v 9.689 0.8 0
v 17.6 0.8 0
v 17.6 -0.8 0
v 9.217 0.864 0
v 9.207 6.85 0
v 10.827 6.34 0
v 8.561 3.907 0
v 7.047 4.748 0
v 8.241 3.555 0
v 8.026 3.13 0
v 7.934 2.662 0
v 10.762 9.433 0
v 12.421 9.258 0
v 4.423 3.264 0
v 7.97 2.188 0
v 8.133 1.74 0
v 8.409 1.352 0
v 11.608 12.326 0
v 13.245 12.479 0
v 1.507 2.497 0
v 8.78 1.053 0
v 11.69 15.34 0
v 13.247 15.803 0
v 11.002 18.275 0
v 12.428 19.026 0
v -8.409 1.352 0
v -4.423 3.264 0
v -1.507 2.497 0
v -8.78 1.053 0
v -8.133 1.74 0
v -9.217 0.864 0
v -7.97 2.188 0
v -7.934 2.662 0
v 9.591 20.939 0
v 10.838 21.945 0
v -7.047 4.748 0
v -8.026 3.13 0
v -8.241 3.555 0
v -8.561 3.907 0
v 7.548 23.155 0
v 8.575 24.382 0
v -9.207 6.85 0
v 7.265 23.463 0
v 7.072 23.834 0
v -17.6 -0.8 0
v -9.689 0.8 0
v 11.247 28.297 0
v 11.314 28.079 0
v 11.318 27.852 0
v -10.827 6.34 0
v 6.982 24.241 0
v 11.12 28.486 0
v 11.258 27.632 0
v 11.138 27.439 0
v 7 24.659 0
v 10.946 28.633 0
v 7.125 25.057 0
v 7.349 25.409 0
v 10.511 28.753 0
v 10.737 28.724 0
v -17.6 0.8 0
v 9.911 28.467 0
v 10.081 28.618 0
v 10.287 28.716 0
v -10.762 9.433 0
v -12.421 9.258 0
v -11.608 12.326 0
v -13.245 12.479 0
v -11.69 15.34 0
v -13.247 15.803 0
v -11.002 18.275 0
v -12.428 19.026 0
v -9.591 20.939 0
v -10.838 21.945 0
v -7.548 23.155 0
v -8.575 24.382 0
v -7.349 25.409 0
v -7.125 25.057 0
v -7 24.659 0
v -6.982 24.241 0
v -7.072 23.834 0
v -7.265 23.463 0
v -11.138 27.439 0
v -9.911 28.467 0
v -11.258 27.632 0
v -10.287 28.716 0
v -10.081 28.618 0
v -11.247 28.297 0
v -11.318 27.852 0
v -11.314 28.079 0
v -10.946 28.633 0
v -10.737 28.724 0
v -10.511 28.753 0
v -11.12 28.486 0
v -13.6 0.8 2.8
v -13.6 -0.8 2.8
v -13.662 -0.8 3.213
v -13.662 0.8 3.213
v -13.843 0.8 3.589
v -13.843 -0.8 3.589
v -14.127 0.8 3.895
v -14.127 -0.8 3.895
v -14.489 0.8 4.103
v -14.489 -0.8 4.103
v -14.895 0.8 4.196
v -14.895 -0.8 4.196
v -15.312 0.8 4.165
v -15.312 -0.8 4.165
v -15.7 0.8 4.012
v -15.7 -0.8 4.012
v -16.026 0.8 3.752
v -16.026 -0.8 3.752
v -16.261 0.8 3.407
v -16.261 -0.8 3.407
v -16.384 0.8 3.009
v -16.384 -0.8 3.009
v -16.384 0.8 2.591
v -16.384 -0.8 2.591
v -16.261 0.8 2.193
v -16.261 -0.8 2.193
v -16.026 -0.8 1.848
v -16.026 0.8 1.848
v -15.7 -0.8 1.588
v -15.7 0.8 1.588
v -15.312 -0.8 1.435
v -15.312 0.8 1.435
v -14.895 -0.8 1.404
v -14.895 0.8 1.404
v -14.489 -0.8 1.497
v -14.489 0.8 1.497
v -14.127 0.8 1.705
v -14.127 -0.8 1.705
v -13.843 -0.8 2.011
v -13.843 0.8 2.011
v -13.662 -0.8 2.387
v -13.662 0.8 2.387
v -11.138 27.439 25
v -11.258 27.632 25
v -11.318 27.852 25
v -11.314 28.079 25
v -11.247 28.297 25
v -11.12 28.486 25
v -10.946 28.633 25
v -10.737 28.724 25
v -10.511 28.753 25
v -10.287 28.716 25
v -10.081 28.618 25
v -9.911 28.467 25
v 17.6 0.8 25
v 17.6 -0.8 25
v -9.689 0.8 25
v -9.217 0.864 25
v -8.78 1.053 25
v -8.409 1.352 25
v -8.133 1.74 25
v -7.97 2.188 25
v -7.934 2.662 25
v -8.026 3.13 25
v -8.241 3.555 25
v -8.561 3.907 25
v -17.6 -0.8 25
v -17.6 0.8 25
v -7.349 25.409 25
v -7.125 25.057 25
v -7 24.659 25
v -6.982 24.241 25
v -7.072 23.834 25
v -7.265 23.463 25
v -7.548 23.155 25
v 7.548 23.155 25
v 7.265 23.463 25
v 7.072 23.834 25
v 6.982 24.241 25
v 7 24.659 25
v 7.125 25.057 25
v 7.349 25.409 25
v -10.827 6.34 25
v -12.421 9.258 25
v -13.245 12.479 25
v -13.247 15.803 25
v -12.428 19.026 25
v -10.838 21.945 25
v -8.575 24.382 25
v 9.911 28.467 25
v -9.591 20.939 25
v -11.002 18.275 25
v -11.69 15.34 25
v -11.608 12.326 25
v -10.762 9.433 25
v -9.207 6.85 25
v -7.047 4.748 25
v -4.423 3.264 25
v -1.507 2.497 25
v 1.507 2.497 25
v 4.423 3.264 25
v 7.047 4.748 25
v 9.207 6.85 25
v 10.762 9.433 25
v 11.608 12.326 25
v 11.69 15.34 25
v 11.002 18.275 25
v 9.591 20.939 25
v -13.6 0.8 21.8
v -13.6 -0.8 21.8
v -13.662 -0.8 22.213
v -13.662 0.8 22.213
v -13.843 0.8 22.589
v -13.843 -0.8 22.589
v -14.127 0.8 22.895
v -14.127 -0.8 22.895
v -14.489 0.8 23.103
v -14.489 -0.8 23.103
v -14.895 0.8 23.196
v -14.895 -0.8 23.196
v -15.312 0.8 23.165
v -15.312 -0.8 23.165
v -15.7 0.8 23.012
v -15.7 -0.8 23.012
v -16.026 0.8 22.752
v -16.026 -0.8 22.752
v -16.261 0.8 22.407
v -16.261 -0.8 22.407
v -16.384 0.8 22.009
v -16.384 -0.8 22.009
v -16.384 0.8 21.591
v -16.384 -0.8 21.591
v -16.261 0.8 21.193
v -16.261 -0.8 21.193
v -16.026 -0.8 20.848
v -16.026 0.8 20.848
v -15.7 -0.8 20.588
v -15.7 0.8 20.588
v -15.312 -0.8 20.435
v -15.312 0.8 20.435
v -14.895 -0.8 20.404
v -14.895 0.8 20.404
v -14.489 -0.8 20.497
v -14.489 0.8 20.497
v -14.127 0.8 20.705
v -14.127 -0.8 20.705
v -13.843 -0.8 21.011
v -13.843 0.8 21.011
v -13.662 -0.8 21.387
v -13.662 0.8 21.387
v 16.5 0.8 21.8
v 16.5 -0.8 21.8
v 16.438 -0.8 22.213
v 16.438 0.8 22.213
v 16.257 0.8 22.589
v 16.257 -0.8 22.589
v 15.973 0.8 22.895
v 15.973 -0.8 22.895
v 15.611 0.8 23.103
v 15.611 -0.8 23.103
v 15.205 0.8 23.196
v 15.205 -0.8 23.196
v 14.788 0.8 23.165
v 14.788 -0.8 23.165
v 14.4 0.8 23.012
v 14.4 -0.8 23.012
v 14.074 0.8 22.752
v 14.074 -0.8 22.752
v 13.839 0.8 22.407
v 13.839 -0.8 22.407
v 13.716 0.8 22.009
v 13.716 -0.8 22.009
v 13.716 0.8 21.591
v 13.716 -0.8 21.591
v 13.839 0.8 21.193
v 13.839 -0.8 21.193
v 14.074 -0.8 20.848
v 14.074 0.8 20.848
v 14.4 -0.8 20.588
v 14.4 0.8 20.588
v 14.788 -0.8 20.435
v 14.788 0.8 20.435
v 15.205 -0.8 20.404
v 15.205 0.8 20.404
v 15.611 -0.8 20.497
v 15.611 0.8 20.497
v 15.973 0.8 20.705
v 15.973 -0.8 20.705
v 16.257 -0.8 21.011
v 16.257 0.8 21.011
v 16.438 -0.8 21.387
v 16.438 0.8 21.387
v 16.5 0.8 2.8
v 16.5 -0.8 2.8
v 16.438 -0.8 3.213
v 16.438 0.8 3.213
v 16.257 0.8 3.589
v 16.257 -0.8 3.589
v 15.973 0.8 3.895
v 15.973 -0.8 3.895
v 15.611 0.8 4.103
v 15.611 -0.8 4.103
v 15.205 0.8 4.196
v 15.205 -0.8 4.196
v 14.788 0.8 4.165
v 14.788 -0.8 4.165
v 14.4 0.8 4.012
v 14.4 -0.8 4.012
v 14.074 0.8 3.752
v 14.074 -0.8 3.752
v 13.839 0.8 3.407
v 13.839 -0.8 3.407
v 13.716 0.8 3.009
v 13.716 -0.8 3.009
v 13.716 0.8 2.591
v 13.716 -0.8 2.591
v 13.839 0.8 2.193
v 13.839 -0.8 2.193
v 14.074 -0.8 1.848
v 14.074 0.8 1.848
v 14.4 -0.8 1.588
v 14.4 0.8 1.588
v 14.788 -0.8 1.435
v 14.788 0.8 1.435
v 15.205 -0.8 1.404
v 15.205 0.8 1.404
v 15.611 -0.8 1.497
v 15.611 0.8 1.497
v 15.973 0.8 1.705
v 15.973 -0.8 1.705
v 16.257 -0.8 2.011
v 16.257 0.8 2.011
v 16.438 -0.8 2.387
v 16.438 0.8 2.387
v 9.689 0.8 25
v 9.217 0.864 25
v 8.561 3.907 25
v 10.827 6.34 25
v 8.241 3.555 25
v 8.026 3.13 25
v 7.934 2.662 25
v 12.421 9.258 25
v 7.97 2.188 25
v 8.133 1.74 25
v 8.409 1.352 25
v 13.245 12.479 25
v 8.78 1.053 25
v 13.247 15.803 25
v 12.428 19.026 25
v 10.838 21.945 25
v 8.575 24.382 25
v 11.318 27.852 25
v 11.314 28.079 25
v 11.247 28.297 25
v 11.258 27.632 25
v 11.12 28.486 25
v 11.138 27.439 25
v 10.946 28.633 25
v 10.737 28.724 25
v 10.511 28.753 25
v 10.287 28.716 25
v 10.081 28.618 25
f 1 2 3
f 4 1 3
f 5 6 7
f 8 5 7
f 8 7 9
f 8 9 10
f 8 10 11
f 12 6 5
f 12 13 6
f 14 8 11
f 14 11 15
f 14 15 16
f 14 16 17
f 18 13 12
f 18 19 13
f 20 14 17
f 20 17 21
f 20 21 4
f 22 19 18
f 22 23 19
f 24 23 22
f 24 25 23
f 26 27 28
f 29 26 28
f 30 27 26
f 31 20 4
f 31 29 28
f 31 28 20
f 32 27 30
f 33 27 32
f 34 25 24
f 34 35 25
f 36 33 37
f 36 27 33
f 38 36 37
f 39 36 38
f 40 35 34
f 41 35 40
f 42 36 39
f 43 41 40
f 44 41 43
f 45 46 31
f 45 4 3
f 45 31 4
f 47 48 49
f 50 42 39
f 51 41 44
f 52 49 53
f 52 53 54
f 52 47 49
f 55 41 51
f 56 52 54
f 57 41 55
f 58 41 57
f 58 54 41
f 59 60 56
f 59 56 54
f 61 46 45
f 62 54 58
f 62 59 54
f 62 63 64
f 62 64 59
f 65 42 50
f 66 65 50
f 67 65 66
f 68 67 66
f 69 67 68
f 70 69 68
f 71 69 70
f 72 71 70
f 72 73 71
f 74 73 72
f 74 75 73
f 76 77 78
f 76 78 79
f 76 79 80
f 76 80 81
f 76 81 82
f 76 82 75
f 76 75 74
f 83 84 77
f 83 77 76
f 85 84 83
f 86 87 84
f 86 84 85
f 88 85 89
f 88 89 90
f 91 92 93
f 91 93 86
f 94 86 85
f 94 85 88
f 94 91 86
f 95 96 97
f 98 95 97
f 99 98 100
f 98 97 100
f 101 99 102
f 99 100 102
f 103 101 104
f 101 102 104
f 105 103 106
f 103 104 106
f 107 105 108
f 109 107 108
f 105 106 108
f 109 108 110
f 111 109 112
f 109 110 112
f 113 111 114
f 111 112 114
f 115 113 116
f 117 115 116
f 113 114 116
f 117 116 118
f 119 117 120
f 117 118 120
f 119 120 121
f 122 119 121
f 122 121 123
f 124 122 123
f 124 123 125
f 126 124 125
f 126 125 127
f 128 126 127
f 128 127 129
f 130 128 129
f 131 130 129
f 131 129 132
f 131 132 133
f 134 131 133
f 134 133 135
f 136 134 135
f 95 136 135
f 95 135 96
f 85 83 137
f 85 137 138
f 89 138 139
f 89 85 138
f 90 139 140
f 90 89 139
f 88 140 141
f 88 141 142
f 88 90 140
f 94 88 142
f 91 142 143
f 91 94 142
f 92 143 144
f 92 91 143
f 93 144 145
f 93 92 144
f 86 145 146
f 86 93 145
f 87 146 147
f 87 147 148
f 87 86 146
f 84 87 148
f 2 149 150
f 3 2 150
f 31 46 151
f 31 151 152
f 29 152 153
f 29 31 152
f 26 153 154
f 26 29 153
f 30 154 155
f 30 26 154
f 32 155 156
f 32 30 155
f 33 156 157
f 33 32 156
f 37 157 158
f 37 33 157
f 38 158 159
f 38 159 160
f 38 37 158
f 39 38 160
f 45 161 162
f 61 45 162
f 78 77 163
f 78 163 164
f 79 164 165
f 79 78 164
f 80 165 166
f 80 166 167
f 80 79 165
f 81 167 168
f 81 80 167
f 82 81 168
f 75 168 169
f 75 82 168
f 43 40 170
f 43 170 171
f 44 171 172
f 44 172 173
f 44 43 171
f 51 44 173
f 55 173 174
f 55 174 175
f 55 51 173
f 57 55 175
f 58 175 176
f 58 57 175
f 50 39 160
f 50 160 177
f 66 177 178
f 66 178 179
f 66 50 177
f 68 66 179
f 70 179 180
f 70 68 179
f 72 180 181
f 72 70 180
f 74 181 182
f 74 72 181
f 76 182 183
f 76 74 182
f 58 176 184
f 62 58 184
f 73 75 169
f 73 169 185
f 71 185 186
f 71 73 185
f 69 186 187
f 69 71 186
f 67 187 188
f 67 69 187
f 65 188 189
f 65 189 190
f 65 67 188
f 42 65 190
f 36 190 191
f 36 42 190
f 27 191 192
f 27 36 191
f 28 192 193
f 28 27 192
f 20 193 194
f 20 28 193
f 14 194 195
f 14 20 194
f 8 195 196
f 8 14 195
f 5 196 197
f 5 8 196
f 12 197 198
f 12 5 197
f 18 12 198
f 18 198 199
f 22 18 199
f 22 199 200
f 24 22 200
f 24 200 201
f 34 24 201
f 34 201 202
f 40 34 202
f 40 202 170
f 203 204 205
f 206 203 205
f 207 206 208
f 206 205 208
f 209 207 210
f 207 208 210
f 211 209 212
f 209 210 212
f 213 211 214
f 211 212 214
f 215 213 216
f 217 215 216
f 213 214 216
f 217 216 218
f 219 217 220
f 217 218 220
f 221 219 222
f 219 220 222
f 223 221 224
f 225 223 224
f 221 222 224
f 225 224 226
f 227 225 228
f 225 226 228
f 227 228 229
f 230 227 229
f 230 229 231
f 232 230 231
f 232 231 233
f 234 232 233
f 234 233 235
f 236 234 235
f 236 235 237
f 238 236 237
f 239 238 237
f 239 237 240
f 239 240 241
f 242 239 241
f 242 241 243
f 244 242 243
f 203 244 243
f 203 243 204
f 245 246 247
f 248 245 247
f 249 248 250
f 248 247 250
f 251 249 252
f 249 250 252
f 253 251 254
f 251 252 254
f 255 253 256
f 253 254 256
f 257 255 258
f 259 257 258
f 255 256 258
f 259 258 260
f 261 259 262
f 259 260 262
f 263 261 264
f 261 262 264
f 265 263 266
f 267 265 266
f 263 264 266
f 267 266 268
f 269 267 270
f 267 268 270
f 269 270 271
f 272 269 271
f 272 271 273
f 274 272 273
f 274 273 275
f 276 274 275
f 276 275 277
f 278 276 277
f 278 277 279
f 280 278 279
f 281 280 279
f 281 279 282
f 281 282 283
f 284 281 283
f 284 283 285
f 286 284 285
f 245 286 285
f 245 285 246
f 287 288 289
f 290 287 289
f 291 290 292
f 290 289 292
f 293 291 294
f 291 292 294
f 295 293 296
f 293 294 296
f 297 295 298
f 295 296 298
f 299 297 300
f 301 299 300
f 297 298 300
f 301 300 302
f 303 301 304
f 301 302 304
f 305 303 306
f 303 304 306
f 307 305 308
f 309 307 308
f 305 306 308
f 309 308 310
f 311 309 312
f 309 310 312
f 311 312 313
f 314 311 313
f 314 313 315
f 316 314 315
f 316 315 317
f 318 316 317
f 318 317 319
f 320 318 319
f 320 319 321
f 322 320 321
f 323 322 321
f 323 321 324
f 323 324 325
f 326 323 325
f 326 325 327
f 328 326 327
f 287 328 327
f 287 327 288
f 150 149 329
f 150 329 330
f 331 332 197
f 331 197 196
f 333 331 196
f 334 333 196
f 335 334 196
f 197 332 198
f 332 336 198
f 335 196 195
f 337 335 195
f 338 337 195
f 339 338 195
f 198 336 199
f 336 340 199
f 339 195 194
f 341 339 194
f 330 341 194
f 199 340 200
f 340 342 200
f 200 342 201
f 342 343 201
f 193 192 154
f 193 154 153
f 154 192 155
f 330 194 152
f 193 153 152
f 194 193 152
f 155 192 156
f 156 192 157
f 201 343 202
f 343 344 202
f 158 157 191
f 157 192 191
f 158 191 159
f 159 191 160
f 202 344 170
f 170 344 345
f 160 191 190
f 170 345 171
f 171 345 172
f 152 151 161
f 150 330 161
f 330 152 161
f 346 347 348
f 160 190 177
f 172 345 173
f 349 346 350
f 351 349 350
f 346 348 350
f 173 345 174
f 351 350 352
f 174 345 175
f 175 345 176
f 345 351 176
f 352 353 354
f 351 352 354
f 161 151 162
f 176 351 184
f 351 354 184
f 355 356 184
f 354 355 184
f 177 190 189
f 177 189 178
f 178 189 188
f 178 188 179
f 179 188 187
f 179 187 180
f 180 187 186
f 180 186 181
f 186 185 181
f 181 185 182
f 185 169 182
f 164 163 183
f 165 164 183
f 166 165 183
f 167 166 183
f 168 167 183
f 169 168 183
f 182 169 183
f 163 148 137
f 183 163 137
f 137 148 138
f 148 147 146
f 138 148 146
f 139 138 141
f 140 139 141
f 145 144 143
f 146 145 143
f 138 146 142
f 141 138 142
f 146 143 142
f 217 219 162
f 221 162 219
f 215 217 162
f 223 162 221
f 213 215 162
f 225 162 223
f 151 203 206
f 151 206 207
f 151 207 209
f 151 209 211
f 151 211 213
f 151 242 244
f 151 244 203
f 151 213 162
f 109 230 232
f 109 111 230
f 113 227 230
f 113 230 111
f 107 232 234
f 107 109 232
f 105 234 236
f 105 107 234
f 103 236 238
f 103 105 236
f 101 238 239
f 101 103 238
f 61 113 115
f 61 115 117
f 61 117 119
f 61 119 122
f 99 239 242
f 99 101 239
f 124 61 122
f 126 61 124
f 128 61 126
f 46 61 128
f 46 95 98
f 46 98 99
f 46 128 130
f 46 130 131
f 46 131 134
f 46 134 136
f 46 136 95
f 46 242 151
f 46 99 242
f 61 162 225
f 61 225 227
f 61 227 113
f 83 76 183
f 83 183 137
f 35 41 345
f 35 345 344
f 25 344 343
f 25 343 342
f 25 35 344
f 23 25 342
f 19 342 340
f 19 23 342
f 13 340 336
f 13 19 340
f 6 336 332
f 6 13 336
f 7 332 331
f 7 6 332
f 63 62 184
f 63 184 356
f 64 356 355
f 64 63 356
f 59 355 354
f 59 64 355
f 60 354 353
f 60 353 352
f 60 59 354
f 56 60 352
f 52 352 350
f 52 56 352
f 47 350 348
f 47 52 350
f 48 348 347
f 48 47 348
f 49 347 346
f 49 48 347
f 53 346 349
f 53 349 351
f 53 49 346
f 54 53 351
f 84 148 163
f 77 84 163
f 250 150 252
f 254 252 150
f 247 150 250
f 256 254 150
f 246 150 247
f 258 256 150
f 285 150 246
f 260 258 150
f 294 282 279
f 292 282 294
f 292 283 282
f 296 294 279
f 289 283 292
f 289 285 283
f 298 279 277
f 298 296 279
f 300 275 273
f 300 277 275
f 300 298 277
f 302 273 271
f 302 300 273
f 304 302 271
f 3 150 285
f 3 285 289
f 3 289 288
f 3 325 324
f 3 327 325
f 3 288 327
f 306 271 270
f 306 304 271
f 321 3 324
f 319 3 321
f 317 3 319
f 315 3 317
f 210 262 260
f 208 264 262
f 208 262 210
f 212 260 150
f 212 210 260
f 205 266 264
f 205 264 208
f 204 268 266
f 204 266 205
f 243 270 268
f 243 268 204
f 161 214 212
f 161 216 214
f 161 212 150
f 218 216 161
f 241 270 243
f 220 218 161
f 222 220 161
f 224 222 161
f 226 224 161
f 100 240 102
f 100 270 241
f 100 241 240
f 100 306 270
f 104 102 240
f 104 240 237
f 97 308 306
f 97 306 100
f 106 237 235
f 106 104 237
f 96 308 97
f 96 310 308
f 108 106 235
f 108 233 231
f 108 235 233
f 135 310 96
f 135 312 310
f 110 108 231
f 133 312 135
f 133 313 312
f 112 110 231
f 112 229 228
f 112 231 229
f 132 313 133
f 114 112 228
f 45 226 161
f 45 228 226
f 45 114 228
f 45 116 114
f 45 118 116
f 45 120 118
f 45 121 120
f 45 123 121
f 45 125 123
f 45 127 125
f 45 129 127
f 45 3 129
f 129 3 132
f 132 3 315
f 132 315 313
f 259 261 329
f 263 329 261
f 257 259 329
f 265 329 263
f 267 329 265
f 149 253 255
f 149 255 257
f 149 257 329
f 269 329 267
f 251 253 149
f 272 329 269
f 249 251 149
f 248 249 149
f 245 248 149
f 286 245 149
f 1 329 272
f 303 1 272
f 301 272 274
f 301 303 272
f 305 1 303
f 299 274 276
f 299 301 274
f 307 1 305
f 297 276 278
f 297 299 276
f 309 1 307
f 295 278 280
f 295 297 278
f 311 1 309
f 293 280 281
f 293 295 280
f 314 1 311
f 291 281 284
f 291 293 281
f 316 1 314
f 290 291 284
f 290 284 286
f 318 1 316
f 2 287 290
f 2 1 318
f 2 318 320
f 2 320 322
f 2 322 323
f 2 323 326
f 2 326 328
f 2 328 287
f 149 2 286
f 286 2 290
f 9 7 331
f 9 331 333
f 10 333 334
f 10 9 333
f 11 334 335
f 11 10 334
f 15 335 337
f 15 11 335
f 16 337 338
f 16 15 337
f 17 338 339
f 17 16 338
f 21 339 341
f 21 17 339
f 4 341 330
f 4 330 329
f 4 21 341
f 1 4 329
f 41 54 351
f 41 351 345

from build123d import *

# Parameters (mm, degrees)
BOSS_EXTRUDE1_DEPTH = 25
CUT_EXTRUDE1_REACH  = 31.553
SKETCH3_R           = 1.4


with BuildPart() as part:
    # Sketch1 → Boss-Extrude1 (new body)
    with BuildSketch(Plane.XY):
        with BuildLine():
            Line((-17.6, 0.8), (-9.688838924, 0.8))
            ThreePointArc((-9.688838924, 0.8), (-8.036343261, 1.958278485), (-8.561462594, 3.906765244))
            ThreePointArc((-8.561462594, 3.906765244), (-13.349996928, 14.140943968), (-8.575351799, 24.381609919))
            Line((-8.575351799, 24.381609919), (-11.137608501, 27.438745265))
            ThreePointArc((-11.137608501, 27.438745265), (-11.038357078, 28.565754207), (-9.911348137, 28.466502784))
            Line((-9.911348137, 28.466502784), (-7.349091434, 25.409367438))
            ThreePointArc((-7.349091434, 25.409367438), (-6.981520468, 24.24124721), (-7.54759428, 23.155349554))
            ThreePointArc((-7.54759428, 23.155349554), (0, 2.4), (7.54759428, 23.155349554))
            ThreePointArc((7.54759428, 23.155349554), (6.981520468, 24.24124721), (7.349091434, 25.409367438))
            Line((7.349091434, 25.409367438), (9.911348137, 28.466502784))
            ThreePointArc((9.911348137, 28.466502784), (11.038357078, 28.565754207), (11.137608501, 27.438745265))
            Line((11.137608501, 27.438745265), (8.575351799, 24.381609919))
            ThreePointArc((8.575351799, 24.381609919), (13.349996928, 14.140943968), (8.561462594, 3.906765244))
            ThreePointArc((8.561462594, 3.906765244), (8.036343261, 1.958278485), (9.688838924, 0.8))
            Line((9.688838924, 0.8), (17.6, 0.8))
            Line((17.6, 0.8), (17.6, -0.8))
            Line((17.6, -0.8), (-17.6, -0.8))
            Line((-17.6, -0.8), (-17.6, 0.8))
        make_face()
    extrude(amount=BOSS_EXTRUDE1_DEPTH)

    # Sketch3 → Cut-Extrude1 (cut, up to next)
    with BuildSketch(Plane.XZ.offset(0.8), mode=Mode.PRIVATE) as cut_extrude1_sk1:
        with Locations((-15, 21.8)):
            Circle(SKETCH3_R)
    cut_extrude1_tool1 = extrude(cut_extrude1_sk1.sketch, amount=-CUT_EXTRUDE1_REACH, mode=Mode.PRIVATE) & part.part
    add(cut_extrude1_tool1.solids().sort_by_distance((-15, -0.8, 21.8))[0], mode=Mode.SUBTRACT)
    # Sketch3 → Cut-Extrude1 (cut, up to next)
    with BuildSketch(Plane.XZ.offset(0.8), mode=Mode.PRIVATE) as cut_extrude1_sk2:
        with Locations((15.1, 21.8)):
            Circle(SKETCH3_R)
    cut_extrude1_tool2 = extrude(cut_extrude1_sk2.sketch, amount=-CUT_EXTRUDE1_REACH, mode=Mode.PRIVATE) & part.part
    add(cut_extrude1_tool2.solids().sort_by_distance((15.1, -0.8, 21.8))[0], mode=Mode.SUBTRACT)
    # Sketch3 → Cut-Extrude1 (cut, up to next)
    with BuildSketch(Plane.XZ.offset(0.8), mode=Mode.PRIVATE) as cut_extrude1_sk3:
        with Locations((-15, 2.8)):
            Circle(SKETCH3_R)
    cut_extrude1_tool3 = extrude(cut_extrude1_sk3.sketch, amount=-CUT_EXTRUDE1_REACH, mode=Mode.PRIVATE) & part.part
    add(cut_extrude1_tool3.solids().sort_by_distance((-15, -0.8, 2.8))[0], mode=Mode.SUBTRACT)
    # Sketch3 → Cut-Extrude1 (cut, up to next)
    with BuildSketch(Plane.XZ.offset(0.8), mode=Mode.PRIVATE) as cut_extrude1_sk4:
        with Locations((15.1, 2.8)):
            Circle(SKETCH3_R)
    cut_extrude1_tool4 = extrude(cut_extrude1_sk4.sketch, amount=-CUT_EXTRUDE1_REACH, mode=Mode.PRIVATE) & part.part
    add(cut_extrude1_tool4.solids().sort_by_distance((15.1, -0.8, 2.8))[0], mode=Mode.SUBTRACT)


solid = part.part
